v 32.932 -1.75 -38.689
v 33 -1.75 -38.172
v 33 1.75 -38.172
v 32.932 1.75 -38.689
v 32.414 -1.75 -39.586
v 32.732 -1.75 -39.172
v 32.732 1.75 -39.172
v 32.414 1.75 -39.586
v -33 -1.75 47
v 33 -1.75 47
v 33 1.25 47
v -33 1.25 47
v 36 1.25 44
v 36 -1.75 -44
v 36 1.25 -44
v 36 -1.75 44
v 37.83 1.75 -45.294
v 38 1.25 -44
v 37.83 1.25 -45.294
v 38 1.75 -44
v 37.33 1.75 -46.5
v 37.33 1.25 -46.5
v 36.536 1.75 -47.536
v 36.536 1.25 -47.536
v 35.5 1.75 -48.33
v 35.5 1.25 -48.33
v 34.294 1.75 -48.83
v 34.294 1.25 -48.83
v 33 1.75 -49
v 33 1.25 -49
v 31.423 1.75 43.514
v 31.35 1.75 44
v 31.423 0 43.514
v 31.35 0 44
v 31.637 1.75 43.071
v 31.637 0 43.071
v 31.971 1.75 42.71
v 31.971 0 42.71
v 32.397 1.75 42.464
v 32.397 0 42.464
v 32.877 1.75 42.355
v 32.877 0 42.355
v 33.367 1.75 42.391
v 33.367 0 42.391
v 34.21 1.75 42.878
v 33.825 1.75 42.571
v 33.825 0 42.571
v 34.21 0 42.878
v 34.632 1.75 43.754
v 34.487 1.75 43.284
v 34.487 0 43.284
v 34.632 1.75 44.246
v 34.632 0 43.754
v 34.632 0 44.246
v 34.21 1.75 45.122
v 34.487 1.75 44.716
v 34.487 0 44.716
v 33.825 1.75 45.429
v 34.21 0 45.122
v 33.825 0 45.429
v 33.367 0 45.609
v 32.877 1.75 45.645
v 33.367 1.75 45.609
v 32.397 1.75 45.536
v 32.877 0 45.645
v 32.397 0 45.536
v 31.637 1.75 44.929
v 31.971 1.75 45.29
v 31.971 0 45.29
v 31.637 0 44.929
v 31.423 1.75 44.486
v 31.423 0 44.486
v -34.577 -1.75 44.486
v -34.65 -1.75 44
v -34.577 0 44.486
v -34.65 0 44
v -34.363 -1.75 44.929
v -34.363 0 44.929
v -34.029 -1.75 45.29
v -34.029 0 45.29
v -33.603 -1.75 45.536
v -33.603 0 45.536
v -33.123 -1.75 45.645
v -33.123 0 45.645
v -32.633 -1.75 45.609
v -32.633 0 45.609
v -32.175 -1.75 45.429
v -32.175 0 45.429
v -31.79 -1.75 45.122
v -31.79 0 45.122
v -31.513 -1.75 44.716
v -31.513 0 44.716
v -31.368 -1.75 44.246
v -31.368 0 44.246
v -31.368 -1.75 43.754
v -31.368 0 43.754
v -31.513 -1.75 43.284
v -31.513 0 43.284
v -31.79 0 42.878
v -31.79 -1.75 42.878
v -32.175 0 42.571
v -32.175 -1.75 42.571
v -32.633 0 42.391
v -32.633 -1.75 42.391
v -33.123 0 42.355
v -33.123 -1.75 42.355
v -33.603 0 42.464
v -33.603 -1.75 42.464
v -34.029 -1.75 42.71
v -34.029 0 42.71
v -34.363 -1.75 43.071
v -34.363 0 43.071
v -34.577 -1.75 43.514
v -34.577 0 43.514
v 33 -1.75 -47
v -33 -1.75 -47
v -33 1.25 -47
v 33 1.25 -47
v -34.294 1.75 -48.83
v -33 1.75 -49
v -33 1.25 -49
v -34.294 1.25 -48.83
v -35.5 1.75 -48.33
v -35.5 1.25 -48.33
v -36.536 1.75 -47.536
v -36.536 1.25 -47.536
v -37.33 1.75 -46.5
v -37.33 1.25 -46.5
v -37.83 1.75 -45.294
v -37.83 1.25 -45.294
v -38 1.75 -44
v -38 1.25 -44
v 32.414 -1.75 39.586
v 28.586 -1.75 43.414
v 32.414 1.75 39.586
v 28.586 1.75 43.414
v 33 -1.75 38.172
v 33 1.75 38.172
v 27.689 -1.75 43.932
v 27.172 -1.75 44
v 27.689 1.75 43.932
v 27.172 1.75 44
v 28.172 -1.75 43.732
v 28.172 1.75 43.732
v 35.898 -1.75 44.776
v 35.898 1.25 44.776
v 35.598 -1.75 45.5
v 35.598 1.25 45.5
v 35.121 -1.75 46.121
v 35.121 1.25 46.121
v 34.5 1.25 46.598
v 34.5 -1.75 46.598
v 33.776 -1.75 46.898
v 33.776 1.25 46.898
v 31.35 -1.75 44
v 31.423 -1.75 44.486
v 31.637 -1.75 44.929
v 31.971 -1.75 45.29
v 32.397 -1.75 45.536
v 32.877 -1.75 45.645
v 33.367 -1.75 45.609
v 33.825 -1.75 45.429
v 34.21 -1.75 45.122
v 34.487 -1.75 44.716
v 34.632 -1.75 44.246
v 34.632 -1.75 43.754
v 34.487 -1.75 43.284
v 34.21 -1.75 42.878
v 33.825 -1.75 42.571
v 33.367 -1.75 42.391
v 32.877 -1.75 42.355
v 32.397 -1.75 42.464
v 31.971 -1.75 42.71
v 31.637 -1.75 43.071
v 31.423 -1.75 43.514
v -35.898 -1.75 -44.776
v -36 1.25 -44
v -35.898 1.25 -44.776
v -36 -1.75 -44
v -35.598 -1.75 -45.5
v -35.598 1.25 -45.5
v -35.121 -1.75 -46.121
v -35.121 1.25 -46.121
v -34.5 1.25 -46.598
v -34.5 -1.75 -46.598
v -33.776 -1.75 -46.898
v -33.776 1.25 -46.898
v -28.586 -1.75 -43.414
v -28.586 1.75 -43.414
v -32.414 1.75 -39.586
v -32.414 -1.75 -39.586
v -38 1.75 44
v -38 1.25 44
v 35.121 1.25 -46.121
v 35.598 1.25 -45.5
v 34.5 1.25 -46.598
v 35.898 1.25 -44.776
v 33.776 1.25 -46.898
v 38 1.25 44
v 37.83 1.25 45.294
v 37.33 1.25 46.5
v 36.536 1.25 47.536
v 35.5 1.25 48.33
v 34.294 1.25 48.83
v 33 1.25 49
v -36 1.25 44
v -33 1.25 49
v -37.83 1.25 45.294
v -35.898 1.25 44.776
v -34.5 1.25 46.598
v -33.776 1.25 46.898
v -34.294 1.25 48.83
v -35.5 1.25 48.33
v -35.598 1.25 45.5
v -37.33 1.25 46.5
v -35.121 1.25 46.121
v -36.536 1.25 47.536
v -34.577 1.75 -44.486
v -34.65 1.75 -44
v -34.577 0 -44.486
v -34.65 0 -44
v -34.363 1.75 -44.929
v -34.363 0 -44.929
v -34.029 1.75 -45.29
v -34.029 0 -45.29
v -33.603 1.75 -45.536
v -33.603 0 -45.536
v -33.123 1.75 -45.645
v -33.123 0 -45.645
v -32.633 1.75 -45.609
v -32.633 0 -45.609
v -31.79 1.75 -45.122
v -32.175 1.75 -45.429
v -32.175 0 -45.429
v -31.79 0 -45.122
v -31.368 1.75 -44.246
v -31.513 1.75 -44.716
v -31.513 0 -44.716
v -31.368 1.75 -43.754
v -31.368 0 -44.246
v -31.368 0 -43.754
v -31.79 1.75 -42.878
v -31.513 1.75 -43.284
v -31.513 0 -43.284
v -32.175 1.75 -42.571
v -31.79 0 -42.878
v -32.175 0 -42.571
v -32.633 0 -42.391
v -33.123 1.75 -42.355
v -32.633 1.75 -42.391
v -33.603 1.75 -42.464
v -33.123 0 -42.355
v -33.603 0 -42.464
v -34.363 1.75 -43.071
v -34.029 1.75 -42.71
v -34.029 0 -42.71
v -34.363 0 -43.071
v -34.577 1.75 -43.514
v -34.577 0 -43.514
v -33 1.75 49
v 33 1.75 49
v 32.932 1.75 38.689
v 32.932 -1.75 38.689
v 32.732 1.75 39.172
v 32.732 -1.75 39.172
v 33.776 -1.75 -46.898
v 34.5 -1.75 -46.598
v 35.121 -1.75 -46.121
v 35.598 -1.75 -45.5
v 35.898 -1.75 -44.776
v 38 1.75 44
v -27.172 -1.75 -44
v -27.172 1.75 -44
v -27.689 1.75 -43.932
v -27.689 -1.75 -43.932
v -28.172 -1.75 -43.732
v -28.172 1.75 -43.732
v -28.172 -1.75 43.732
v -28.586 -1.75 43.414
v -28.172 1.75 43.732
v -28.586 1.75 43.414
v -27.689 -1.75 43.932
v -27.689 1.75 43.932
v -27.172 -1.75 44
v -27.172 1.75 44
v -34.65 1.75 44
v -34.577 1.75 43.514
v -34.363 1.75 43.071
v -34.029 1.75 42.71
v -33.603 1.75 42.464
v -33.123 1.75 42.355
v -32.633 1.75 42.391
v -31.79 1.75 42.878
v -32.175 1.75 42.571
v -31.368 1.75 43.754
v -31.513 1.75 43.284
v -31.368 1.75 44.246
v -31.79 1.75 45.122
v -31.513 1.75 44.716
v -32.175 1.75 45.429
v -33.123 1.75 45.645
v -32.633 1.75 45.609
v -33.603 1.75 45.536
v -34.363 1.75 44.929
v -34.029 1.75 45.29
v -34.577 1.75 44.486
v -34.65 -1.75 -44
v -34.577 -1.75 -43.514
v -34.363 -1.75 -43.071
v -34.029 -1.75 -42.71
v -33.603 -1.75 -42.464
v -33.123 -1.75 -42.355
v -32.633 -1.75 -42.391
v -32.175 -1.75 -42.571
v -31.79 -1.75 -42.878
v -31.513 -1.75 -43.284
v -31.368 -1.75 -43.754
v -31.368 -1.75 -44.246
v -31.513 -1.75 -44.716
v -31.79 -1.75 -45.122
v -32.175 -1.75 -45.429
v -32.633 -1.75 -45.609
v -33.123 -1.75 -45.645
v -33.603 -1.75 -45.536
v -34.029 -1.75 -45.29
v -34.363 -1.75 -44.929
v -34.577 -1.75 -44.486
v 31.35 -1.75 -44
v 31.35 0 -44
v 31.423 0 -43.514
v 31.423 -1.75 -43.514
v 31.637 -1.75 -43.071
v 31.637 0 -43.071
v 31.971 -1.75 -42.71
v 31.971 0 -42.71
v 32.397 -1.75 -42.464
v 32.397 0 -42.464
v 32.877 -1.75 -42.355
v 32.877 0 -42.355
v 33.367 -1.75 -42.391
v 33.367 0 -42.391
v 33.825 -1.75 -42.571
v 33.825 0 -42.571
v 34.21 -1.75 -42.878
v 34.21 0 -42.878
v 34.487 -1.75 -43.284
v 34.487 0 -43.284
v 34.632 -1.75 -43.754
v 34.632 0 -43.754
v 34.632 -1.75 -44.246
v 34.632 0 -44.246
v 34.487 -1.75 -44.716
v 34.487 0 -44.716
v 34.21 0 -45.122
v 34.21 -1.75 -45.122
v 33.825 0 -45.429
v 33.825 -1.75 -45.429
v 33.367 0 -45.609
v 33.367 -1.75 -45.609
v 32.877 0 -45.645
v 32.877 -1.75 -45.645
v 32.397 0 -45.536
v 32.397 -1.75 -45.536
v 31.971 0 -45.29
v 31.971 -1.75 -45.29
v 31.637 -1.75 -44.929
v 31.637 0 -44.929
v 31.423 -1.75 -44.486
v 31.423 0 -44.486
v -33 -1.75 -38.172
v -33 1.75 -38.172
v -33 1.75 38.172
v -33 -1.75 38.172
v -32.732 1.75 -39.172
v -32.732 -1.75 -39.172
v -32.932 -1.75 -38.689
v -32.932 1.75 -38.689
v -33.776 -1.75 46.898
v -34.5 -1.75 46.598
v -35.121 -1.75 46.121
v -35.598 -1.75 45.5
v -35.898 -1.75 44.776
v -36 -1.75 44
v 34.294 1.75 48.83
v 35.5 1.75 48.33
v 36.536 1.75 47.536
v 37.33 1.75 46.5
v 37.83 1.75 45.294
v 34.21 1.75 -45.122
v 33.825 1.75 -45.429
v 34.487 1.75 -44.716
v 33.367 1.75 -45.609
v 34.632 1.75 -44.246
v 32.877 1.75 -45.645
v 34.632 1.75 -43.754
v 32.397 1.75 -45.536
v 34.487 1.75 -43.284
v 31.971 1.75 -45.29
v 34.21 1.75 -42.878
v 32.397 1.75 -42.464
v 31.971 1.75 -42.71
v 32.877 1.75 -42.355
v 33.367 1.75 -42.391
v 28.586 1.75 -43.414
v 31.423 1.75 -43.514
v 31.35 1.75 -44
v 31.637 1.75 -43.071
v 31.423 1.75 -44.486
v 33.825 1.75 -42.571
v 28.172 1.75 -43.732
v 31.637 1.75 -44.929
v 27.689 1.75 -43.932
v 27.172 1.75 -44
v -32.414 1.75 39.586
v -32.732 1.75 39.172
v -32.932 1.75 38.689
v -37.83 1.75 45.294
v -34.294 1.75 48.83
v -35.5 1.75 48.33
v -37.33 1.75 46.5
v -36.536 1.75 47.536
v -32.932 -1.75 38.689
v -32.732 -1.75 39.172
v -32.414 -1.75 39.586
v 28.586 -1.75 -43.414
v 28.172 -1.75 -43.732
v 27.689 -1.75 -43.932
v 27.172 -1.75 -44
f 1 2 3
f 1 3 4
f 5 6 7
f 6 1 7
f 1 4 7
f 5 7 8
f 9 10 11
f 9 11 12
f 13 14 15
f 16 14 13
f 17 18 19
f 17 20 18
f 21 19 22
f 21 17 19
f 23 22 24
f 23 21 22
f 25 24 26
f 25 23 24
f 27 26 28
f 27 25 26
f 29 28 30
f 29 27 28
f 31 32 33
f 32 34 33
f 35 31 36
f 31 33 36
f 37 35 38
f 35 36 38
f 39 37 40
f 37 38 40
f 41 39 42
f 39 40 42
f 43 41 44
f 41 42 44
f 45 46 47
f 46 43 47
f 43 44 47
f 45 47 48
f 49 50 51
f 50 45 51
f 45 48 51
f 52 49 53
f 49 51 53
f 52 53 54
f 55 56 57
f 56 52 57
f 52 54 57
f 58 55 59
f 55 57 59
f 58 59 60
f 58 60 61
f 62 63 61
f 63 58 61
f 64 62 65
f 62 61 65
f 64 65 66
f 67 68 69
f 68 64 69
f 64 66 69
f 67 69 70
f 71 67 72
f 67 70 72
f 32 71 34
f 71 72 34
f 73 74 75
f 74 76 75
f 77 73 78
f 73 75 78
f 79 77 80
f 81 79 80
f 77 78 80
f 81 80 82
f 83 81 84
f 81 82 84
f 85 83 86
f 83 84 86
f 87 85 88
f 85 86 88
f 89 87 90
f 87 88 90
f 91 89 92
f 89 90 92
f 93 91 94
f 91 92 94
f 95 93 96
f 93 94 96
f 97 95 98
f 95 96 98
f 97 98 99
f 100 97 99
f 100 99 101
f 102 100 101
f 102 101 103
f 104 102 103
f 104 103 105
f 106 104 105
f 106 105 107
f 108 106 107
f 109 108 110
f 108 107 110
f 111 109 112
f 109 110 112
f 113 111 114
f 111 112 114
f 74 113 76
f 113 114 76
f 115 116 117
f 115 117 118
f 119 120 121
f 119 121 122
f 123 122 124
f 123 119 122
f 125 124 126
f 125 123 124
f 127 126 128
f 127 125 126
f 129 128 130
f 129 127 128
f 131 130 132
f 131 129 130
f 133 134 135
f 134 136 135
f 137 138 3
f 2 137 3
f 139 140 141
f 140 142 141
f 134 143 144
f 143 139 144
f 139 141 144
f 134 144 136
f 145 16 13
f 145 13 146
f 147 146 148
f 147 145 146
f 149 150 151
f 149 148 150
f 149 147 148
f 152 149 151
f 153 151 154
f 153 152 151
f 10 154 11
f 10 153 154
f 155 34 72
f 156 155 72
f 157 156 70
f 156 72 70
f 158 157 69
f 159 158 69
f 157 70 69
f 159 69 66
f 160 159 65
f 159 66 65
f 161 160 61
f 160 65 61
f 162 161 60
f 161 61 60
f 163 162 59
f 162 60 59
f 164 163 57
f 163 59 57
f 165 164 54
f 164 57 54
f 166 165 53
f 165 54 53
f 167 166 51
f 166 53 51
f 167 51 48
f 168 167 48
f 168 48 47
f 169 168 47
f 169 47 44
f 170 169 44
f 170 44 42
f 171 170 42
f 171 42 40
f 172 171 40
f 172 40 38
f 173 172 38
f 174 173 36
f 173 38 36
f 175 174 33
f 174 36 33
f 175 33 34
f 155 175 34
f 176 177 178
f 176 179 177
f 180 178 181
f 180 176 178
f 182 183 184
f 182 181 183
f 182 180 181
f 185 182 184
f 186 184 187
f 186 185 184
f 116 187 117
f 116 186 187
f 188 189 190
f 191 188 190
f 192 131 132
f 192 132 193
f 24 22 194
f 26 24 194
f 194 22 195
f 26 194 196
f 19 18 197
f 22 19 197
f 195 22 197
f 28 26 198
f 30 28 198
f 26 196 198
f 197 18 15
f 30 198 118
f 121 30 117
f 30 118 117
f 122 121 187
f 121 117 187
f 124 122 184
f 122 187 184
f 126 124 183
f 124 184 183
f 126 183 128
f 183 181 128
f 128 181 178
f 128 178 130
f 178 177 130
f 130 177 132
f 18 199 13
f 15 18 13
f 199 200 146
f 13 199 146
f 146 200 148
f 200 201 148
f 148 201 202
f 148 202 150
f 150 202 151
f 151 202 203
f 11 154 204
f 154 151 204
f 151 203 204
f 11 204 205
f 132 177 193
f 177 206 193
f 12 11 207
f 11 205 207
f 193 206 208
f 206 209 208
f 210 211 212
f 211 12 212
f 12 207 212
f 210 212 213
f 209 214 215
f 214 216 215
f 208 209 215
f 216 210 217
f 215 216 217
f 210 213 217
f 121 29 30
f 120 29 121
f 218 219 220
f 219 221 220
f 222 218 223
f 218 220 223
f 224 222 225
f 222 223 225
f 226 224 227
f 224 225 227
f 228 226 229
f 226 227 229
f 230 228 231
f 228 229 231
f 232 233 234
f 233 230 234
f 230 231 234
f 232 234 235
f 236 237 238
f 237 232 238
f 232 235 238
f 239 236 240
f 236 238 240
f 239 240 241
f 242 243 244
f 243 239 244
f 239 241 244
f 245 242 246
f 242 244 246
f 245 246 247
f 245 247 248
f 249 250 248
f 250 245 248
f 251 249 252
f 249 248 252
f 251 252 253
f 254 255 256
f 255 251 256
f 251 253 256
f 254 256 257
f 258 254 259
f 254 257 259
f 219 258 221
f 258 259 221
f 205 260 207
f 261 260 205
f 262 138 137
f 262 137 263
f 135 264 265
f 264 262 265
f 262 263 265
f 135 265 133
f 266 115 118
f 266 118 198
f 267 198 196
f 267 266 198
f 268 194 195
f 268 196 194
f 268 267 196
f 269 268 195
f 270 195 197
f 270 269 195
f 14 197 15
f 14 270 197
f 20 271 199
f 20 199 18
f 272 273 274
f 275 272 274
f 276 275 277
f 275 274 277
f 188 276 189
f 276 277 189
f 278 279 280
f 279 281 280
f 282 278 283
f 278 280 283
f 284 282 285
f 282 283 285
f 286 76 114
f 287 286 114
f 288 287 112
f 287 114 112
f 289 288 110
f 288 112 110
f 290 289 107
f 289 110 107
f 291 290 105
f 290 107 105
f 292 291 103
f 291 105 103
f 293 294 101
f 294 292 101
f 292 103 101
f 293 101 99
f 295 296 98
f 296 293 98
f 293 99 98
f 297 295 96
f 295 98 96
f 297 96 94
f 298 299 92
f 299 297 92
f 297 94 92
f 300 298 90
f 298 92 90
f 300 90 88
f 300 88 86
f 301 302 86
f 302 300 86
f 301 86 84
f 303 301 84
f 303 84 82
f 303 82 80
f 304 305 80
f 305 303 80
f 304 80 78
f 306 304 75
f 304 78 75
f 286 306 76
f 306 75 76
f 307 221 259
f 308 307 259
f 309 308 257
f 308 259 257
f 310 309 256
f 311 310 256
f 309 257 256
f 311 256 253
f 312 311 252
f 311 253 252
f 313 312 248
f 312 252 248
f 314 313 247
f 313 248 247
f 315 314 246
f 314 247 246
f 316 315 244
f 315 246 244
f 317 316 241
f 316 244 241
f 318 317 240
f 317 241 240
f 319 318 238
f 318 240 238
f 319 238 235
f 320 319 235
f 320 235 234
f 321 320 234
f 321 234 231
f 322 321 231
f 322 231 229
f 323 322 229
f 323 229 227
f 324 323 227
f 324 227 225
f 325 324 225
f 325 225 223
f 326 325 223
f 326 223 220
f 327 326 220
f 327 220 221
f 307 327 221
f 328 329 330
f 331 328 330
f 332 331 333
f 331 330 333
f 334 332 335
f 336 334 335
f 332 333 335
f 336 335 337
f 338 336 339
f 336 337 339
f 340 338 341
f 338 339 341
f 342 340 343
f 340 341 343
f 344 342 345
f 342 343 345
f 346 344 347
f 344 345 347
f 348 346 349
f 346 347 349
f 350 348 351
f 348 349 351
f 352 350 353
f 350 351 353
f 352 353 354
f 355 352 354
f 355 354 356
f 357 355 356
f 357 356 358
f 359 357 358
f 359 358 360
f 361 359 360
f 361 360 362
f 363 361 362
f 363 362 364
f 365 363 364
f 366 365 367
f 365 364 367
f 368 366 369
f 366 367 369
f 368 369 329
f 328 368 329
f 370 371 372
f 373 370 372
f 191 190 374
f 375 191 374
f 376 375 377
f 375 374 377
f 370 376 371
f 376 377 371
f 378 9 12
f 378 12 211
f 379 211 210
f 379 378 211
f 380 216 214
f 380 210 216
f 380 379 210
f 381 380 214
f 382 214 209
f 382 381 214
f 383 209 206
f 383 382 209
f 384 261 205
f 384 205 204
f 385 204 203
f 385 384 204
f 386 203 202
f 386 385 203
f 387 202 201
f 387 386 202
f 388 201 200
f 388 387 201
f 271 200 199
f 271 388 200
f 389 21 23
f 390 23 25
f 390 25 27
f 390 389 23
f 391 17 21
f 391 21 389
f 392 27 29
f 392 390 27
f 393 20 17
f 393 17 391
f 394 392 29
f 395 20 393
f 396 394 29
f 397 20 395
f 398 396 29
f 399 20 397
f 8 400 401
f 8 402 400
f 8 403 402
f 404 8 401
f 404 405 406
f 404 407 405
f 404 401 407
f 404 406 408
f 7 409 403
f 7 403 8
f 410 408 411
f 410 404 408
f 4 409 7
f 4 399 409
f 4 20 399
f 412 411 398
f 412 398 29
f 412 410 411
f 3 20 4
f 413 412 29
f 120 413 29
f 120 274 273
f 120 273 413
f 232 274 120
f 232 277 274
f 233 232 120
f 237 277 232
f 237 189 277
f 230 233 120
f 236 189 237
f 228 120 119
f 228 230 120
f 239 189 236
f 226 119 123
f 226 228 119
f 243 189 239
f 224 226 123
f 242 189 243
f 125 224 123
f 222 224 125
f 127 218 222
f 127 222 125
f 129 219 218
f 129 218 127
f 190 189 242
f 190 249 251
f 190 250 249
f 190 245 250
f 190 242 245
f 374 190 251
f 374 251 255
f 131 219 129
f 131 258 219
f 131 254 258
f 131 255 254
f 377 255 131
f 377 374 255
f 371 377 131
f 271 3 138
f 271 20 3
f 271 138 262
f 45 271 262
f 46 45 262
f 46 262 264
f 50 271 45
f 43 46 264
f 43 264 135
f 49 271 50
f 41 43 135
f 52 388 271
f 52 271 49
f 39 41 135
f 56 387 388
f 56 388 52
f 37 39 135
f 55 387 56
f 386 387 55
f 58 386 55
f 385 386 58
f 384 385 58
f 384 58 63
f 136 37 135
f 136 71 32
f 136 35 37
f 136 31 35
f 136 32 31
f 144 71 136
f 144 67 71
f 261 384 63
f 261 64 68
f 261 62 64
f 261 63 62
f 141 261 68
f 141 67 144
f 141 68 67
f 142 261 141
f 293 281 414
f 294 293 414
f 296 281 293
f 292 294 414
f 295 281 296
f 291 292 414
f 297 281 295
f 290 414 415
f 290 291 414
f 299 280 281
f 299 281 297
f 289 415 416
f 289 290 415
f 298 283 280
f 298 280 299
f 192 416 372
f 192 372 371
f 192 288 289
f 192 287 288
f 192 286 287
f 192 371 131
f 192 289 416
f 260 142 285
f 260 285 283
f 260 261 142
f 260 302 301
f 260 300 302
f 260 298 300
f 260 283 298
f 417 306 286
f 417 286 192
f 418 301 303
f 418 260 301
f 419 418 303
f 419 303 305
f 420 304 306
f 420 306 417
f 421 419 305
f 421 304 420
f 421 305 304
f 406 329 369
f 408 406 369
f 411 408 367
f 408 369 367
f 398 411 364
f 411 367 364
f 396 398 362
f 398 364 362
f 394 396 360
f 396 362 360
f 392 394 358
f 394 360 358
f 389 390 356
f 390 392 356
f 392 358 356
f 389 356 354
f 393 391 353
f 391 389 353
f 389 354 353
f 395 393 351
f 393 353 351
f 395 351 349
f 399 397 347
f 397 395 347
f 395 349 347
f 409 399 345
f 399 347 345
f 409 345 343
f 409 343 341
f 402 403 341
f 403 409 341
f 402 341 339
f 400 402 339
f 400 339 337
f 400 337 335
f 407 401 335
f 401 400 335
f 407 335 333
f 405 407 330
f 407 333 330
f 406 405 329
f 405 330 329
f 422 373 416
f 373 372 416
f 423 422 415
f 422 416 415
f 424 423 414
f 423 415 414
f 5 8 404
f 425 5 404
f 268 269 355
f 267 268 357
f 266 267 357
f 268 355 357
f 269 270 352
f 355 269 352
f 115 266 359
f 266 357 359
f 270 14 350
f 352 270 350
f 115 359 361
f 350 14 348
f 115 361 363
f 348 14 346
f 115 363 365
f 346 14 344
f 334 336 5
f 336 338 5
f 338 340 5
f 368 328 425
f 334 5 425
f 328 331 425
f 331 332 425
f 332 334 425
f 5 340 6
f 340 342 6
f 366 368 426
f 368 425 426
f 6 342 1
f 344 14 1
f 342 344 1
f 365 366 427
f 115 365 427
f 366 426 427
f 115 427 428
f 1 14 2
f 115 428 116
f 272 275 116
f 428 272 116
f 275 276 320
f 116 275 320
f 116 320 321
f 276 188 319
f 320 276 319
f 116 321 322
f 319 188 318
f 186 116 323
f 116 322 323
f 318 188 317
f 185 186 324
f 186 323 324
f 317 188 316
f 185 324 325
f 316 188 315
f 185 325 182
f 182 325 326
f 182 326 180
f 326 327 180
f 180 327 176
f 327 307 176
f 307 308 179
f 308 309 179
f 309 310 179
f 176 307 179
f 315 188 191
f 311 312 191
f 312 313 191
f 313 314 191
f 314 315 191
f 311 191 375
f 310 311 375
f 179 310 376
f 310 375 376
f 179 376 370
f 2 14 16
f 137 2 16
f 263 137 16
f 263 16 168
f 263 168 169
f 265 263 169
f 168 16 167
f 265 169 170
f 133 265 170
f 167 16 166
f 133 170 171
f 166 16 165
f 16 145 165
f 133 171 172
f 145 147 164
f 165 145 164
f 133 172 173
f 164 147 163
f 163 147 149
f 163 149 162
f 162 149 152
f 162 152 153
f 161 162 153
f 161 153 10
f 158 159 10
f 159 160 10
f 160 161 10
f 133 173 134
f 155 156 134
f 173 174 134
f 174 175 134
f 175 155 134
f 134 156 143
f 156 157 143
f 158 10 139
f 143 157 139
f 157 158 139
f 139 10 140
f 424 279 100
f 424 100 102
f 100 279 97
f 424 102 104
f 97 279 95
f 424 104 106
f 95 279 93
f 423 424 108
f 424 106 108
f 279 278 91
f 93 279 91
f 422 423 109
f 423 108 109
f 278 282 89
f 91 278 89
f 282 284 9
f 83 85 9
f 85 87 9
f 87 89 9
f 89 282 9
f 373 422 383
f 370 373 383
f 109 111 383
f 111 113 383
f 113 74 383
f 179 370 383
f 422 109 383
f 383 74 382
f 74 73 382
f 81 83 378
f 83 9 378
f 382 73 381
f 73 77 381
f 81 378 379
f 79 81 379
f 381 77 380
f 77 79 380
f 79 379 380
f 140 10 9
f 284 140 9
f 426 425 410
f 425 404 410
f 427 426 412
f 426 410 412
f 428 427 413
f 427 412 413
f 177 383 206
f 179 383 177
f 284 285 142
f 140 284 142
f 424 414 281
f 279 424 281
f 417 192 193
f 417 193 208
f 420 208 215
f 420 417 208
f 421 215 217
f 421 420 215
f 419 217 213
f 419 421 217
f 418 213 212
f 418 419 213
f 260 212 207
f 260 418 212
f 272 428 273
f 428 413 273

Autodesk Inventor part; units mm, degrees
ref_plane "YZ Plane" through (0, 0, 0) normal (1, 0, 0) x (0, 1, 0)
ref_plane "XZ Plane" through (0, 0, 0) normal (0, 1, 0) x (-1, 0, 0)
ref_plane "XY Plane" through (0, 0, 0) normal (0, 0, 1) x (1, 0, 0)
sketch "Sketch1" plane through (0, 0, 0) normal (0, 1, 0) x (-1, 0, 0)
  line L0 (33, 44) -> (-33, 44) construction
  line L1 (-33, 44) -> (-33, -44) construction
  line L2 (-33, -44) -> (33, -44) construction
  line L3 (33, -44) -> (33, 44) construction
  line L4 (33, 49) -> (-33, 49)
  line L5 (-38, 44) -> (-38, -44)
  line L6 (-33, -49) -> (33, -49)
  line L7 (38, -44) -> (38, 44)
  arc A0 (38, 44) -> (33, 49) centre (33, 44) ccw
  arc A1 (-33, 49) -> (-38, 44) centre (-33, 44) ccw
  arc A2 (-38, -44) -> (-33, -49) centre (-33, -44) ccw
  arc A3 (33, -49) -> (38, -44) centre (33, -44) ccw
  line L8 (-33, 47) -> (33, 47)
  arc A4 (36, 44) -> (33, 47) centre (33, 44) ccw
  line L9 (36, 44) -> (36, -44)
  arc A5 (33, -47) -> (36, -44) centre (33, -44) ccw
  line L10 (33, -47) -> (-33, -47)
  arc A6 (-36, -44) -> (-33, -47) centre (-33, -44) ccw
  line L11 (-36, -44) -> (-36, 44)
  arc A7 (-33, 47) -> (-36, 44) centre (-33, 44) ccw
  circle A8 centre (33, 44) radius 1.65
  circle A9 centre (33, -44) radius 1.65
  circle A10 centre (-33, -44) radius 1.65
  circle A11 centre (-33, 44) radius 1.65
  line L12 (33, 39) -> (28, 44)
  line L13 (28, 44) -> (-28, 44)
  line L14 (-28, 44) -> (-33, 39)
  line L15 (-33, 39) -> (-33, -39)
  line L16 (-33, -39) -> (-28, -44)
  line L17 (-28, -44) -> (28, -44)
  line L18 (28, -44) -> (33, -39)
  line L19 (33, -39) -> (33, 39)
  point P0 (0, 0)
  point P1 (33, 0)
  point P2 (38, 49)
  point P3 (-38, 49)
  point P4 (38, -49)
  point P5 (-38, 0)
  point P6 (0, 49)
  point P7 (0, 44)
  dimension "d0" = 76
  dimension "d1" = 98
  dimension "d2" = 5
  dimension "d3" = 2
  dimension "d4" = 3.3
  dimension "d5" = 1.35
  dimension "d6" = 1.35
  dimension "d7" = 66
  dimension "d8" = 88
  dimension "d9" = 5
  dimension "d10" = 3.5355
extrude "Extrusion1" add sketch "Sketch1" along normal mid plane 3.5 contours A0 L7 A3 L6 A2 L5 A1 L4 | L8 A4 L9 A5 L10 A6 L11 A7
fillet "Fillet1" radius 2 8 edges at (-33, 0, -39) (-28, 0, -44) (28, 0, -44) (33, 0, -39) (33, 0, 39) (28, 0, 44) (-33, 0, 39) (-28, 0, 44)
extrude "Extrusion2" cut sketch "Sketch1" along normal blind 1.25 and the other way blind 1.75 contours A0 L7 A3 L6 A2 L5 A1 L4
properties part number "SolarPanel_CoilForm" material "ABS Plastic"
